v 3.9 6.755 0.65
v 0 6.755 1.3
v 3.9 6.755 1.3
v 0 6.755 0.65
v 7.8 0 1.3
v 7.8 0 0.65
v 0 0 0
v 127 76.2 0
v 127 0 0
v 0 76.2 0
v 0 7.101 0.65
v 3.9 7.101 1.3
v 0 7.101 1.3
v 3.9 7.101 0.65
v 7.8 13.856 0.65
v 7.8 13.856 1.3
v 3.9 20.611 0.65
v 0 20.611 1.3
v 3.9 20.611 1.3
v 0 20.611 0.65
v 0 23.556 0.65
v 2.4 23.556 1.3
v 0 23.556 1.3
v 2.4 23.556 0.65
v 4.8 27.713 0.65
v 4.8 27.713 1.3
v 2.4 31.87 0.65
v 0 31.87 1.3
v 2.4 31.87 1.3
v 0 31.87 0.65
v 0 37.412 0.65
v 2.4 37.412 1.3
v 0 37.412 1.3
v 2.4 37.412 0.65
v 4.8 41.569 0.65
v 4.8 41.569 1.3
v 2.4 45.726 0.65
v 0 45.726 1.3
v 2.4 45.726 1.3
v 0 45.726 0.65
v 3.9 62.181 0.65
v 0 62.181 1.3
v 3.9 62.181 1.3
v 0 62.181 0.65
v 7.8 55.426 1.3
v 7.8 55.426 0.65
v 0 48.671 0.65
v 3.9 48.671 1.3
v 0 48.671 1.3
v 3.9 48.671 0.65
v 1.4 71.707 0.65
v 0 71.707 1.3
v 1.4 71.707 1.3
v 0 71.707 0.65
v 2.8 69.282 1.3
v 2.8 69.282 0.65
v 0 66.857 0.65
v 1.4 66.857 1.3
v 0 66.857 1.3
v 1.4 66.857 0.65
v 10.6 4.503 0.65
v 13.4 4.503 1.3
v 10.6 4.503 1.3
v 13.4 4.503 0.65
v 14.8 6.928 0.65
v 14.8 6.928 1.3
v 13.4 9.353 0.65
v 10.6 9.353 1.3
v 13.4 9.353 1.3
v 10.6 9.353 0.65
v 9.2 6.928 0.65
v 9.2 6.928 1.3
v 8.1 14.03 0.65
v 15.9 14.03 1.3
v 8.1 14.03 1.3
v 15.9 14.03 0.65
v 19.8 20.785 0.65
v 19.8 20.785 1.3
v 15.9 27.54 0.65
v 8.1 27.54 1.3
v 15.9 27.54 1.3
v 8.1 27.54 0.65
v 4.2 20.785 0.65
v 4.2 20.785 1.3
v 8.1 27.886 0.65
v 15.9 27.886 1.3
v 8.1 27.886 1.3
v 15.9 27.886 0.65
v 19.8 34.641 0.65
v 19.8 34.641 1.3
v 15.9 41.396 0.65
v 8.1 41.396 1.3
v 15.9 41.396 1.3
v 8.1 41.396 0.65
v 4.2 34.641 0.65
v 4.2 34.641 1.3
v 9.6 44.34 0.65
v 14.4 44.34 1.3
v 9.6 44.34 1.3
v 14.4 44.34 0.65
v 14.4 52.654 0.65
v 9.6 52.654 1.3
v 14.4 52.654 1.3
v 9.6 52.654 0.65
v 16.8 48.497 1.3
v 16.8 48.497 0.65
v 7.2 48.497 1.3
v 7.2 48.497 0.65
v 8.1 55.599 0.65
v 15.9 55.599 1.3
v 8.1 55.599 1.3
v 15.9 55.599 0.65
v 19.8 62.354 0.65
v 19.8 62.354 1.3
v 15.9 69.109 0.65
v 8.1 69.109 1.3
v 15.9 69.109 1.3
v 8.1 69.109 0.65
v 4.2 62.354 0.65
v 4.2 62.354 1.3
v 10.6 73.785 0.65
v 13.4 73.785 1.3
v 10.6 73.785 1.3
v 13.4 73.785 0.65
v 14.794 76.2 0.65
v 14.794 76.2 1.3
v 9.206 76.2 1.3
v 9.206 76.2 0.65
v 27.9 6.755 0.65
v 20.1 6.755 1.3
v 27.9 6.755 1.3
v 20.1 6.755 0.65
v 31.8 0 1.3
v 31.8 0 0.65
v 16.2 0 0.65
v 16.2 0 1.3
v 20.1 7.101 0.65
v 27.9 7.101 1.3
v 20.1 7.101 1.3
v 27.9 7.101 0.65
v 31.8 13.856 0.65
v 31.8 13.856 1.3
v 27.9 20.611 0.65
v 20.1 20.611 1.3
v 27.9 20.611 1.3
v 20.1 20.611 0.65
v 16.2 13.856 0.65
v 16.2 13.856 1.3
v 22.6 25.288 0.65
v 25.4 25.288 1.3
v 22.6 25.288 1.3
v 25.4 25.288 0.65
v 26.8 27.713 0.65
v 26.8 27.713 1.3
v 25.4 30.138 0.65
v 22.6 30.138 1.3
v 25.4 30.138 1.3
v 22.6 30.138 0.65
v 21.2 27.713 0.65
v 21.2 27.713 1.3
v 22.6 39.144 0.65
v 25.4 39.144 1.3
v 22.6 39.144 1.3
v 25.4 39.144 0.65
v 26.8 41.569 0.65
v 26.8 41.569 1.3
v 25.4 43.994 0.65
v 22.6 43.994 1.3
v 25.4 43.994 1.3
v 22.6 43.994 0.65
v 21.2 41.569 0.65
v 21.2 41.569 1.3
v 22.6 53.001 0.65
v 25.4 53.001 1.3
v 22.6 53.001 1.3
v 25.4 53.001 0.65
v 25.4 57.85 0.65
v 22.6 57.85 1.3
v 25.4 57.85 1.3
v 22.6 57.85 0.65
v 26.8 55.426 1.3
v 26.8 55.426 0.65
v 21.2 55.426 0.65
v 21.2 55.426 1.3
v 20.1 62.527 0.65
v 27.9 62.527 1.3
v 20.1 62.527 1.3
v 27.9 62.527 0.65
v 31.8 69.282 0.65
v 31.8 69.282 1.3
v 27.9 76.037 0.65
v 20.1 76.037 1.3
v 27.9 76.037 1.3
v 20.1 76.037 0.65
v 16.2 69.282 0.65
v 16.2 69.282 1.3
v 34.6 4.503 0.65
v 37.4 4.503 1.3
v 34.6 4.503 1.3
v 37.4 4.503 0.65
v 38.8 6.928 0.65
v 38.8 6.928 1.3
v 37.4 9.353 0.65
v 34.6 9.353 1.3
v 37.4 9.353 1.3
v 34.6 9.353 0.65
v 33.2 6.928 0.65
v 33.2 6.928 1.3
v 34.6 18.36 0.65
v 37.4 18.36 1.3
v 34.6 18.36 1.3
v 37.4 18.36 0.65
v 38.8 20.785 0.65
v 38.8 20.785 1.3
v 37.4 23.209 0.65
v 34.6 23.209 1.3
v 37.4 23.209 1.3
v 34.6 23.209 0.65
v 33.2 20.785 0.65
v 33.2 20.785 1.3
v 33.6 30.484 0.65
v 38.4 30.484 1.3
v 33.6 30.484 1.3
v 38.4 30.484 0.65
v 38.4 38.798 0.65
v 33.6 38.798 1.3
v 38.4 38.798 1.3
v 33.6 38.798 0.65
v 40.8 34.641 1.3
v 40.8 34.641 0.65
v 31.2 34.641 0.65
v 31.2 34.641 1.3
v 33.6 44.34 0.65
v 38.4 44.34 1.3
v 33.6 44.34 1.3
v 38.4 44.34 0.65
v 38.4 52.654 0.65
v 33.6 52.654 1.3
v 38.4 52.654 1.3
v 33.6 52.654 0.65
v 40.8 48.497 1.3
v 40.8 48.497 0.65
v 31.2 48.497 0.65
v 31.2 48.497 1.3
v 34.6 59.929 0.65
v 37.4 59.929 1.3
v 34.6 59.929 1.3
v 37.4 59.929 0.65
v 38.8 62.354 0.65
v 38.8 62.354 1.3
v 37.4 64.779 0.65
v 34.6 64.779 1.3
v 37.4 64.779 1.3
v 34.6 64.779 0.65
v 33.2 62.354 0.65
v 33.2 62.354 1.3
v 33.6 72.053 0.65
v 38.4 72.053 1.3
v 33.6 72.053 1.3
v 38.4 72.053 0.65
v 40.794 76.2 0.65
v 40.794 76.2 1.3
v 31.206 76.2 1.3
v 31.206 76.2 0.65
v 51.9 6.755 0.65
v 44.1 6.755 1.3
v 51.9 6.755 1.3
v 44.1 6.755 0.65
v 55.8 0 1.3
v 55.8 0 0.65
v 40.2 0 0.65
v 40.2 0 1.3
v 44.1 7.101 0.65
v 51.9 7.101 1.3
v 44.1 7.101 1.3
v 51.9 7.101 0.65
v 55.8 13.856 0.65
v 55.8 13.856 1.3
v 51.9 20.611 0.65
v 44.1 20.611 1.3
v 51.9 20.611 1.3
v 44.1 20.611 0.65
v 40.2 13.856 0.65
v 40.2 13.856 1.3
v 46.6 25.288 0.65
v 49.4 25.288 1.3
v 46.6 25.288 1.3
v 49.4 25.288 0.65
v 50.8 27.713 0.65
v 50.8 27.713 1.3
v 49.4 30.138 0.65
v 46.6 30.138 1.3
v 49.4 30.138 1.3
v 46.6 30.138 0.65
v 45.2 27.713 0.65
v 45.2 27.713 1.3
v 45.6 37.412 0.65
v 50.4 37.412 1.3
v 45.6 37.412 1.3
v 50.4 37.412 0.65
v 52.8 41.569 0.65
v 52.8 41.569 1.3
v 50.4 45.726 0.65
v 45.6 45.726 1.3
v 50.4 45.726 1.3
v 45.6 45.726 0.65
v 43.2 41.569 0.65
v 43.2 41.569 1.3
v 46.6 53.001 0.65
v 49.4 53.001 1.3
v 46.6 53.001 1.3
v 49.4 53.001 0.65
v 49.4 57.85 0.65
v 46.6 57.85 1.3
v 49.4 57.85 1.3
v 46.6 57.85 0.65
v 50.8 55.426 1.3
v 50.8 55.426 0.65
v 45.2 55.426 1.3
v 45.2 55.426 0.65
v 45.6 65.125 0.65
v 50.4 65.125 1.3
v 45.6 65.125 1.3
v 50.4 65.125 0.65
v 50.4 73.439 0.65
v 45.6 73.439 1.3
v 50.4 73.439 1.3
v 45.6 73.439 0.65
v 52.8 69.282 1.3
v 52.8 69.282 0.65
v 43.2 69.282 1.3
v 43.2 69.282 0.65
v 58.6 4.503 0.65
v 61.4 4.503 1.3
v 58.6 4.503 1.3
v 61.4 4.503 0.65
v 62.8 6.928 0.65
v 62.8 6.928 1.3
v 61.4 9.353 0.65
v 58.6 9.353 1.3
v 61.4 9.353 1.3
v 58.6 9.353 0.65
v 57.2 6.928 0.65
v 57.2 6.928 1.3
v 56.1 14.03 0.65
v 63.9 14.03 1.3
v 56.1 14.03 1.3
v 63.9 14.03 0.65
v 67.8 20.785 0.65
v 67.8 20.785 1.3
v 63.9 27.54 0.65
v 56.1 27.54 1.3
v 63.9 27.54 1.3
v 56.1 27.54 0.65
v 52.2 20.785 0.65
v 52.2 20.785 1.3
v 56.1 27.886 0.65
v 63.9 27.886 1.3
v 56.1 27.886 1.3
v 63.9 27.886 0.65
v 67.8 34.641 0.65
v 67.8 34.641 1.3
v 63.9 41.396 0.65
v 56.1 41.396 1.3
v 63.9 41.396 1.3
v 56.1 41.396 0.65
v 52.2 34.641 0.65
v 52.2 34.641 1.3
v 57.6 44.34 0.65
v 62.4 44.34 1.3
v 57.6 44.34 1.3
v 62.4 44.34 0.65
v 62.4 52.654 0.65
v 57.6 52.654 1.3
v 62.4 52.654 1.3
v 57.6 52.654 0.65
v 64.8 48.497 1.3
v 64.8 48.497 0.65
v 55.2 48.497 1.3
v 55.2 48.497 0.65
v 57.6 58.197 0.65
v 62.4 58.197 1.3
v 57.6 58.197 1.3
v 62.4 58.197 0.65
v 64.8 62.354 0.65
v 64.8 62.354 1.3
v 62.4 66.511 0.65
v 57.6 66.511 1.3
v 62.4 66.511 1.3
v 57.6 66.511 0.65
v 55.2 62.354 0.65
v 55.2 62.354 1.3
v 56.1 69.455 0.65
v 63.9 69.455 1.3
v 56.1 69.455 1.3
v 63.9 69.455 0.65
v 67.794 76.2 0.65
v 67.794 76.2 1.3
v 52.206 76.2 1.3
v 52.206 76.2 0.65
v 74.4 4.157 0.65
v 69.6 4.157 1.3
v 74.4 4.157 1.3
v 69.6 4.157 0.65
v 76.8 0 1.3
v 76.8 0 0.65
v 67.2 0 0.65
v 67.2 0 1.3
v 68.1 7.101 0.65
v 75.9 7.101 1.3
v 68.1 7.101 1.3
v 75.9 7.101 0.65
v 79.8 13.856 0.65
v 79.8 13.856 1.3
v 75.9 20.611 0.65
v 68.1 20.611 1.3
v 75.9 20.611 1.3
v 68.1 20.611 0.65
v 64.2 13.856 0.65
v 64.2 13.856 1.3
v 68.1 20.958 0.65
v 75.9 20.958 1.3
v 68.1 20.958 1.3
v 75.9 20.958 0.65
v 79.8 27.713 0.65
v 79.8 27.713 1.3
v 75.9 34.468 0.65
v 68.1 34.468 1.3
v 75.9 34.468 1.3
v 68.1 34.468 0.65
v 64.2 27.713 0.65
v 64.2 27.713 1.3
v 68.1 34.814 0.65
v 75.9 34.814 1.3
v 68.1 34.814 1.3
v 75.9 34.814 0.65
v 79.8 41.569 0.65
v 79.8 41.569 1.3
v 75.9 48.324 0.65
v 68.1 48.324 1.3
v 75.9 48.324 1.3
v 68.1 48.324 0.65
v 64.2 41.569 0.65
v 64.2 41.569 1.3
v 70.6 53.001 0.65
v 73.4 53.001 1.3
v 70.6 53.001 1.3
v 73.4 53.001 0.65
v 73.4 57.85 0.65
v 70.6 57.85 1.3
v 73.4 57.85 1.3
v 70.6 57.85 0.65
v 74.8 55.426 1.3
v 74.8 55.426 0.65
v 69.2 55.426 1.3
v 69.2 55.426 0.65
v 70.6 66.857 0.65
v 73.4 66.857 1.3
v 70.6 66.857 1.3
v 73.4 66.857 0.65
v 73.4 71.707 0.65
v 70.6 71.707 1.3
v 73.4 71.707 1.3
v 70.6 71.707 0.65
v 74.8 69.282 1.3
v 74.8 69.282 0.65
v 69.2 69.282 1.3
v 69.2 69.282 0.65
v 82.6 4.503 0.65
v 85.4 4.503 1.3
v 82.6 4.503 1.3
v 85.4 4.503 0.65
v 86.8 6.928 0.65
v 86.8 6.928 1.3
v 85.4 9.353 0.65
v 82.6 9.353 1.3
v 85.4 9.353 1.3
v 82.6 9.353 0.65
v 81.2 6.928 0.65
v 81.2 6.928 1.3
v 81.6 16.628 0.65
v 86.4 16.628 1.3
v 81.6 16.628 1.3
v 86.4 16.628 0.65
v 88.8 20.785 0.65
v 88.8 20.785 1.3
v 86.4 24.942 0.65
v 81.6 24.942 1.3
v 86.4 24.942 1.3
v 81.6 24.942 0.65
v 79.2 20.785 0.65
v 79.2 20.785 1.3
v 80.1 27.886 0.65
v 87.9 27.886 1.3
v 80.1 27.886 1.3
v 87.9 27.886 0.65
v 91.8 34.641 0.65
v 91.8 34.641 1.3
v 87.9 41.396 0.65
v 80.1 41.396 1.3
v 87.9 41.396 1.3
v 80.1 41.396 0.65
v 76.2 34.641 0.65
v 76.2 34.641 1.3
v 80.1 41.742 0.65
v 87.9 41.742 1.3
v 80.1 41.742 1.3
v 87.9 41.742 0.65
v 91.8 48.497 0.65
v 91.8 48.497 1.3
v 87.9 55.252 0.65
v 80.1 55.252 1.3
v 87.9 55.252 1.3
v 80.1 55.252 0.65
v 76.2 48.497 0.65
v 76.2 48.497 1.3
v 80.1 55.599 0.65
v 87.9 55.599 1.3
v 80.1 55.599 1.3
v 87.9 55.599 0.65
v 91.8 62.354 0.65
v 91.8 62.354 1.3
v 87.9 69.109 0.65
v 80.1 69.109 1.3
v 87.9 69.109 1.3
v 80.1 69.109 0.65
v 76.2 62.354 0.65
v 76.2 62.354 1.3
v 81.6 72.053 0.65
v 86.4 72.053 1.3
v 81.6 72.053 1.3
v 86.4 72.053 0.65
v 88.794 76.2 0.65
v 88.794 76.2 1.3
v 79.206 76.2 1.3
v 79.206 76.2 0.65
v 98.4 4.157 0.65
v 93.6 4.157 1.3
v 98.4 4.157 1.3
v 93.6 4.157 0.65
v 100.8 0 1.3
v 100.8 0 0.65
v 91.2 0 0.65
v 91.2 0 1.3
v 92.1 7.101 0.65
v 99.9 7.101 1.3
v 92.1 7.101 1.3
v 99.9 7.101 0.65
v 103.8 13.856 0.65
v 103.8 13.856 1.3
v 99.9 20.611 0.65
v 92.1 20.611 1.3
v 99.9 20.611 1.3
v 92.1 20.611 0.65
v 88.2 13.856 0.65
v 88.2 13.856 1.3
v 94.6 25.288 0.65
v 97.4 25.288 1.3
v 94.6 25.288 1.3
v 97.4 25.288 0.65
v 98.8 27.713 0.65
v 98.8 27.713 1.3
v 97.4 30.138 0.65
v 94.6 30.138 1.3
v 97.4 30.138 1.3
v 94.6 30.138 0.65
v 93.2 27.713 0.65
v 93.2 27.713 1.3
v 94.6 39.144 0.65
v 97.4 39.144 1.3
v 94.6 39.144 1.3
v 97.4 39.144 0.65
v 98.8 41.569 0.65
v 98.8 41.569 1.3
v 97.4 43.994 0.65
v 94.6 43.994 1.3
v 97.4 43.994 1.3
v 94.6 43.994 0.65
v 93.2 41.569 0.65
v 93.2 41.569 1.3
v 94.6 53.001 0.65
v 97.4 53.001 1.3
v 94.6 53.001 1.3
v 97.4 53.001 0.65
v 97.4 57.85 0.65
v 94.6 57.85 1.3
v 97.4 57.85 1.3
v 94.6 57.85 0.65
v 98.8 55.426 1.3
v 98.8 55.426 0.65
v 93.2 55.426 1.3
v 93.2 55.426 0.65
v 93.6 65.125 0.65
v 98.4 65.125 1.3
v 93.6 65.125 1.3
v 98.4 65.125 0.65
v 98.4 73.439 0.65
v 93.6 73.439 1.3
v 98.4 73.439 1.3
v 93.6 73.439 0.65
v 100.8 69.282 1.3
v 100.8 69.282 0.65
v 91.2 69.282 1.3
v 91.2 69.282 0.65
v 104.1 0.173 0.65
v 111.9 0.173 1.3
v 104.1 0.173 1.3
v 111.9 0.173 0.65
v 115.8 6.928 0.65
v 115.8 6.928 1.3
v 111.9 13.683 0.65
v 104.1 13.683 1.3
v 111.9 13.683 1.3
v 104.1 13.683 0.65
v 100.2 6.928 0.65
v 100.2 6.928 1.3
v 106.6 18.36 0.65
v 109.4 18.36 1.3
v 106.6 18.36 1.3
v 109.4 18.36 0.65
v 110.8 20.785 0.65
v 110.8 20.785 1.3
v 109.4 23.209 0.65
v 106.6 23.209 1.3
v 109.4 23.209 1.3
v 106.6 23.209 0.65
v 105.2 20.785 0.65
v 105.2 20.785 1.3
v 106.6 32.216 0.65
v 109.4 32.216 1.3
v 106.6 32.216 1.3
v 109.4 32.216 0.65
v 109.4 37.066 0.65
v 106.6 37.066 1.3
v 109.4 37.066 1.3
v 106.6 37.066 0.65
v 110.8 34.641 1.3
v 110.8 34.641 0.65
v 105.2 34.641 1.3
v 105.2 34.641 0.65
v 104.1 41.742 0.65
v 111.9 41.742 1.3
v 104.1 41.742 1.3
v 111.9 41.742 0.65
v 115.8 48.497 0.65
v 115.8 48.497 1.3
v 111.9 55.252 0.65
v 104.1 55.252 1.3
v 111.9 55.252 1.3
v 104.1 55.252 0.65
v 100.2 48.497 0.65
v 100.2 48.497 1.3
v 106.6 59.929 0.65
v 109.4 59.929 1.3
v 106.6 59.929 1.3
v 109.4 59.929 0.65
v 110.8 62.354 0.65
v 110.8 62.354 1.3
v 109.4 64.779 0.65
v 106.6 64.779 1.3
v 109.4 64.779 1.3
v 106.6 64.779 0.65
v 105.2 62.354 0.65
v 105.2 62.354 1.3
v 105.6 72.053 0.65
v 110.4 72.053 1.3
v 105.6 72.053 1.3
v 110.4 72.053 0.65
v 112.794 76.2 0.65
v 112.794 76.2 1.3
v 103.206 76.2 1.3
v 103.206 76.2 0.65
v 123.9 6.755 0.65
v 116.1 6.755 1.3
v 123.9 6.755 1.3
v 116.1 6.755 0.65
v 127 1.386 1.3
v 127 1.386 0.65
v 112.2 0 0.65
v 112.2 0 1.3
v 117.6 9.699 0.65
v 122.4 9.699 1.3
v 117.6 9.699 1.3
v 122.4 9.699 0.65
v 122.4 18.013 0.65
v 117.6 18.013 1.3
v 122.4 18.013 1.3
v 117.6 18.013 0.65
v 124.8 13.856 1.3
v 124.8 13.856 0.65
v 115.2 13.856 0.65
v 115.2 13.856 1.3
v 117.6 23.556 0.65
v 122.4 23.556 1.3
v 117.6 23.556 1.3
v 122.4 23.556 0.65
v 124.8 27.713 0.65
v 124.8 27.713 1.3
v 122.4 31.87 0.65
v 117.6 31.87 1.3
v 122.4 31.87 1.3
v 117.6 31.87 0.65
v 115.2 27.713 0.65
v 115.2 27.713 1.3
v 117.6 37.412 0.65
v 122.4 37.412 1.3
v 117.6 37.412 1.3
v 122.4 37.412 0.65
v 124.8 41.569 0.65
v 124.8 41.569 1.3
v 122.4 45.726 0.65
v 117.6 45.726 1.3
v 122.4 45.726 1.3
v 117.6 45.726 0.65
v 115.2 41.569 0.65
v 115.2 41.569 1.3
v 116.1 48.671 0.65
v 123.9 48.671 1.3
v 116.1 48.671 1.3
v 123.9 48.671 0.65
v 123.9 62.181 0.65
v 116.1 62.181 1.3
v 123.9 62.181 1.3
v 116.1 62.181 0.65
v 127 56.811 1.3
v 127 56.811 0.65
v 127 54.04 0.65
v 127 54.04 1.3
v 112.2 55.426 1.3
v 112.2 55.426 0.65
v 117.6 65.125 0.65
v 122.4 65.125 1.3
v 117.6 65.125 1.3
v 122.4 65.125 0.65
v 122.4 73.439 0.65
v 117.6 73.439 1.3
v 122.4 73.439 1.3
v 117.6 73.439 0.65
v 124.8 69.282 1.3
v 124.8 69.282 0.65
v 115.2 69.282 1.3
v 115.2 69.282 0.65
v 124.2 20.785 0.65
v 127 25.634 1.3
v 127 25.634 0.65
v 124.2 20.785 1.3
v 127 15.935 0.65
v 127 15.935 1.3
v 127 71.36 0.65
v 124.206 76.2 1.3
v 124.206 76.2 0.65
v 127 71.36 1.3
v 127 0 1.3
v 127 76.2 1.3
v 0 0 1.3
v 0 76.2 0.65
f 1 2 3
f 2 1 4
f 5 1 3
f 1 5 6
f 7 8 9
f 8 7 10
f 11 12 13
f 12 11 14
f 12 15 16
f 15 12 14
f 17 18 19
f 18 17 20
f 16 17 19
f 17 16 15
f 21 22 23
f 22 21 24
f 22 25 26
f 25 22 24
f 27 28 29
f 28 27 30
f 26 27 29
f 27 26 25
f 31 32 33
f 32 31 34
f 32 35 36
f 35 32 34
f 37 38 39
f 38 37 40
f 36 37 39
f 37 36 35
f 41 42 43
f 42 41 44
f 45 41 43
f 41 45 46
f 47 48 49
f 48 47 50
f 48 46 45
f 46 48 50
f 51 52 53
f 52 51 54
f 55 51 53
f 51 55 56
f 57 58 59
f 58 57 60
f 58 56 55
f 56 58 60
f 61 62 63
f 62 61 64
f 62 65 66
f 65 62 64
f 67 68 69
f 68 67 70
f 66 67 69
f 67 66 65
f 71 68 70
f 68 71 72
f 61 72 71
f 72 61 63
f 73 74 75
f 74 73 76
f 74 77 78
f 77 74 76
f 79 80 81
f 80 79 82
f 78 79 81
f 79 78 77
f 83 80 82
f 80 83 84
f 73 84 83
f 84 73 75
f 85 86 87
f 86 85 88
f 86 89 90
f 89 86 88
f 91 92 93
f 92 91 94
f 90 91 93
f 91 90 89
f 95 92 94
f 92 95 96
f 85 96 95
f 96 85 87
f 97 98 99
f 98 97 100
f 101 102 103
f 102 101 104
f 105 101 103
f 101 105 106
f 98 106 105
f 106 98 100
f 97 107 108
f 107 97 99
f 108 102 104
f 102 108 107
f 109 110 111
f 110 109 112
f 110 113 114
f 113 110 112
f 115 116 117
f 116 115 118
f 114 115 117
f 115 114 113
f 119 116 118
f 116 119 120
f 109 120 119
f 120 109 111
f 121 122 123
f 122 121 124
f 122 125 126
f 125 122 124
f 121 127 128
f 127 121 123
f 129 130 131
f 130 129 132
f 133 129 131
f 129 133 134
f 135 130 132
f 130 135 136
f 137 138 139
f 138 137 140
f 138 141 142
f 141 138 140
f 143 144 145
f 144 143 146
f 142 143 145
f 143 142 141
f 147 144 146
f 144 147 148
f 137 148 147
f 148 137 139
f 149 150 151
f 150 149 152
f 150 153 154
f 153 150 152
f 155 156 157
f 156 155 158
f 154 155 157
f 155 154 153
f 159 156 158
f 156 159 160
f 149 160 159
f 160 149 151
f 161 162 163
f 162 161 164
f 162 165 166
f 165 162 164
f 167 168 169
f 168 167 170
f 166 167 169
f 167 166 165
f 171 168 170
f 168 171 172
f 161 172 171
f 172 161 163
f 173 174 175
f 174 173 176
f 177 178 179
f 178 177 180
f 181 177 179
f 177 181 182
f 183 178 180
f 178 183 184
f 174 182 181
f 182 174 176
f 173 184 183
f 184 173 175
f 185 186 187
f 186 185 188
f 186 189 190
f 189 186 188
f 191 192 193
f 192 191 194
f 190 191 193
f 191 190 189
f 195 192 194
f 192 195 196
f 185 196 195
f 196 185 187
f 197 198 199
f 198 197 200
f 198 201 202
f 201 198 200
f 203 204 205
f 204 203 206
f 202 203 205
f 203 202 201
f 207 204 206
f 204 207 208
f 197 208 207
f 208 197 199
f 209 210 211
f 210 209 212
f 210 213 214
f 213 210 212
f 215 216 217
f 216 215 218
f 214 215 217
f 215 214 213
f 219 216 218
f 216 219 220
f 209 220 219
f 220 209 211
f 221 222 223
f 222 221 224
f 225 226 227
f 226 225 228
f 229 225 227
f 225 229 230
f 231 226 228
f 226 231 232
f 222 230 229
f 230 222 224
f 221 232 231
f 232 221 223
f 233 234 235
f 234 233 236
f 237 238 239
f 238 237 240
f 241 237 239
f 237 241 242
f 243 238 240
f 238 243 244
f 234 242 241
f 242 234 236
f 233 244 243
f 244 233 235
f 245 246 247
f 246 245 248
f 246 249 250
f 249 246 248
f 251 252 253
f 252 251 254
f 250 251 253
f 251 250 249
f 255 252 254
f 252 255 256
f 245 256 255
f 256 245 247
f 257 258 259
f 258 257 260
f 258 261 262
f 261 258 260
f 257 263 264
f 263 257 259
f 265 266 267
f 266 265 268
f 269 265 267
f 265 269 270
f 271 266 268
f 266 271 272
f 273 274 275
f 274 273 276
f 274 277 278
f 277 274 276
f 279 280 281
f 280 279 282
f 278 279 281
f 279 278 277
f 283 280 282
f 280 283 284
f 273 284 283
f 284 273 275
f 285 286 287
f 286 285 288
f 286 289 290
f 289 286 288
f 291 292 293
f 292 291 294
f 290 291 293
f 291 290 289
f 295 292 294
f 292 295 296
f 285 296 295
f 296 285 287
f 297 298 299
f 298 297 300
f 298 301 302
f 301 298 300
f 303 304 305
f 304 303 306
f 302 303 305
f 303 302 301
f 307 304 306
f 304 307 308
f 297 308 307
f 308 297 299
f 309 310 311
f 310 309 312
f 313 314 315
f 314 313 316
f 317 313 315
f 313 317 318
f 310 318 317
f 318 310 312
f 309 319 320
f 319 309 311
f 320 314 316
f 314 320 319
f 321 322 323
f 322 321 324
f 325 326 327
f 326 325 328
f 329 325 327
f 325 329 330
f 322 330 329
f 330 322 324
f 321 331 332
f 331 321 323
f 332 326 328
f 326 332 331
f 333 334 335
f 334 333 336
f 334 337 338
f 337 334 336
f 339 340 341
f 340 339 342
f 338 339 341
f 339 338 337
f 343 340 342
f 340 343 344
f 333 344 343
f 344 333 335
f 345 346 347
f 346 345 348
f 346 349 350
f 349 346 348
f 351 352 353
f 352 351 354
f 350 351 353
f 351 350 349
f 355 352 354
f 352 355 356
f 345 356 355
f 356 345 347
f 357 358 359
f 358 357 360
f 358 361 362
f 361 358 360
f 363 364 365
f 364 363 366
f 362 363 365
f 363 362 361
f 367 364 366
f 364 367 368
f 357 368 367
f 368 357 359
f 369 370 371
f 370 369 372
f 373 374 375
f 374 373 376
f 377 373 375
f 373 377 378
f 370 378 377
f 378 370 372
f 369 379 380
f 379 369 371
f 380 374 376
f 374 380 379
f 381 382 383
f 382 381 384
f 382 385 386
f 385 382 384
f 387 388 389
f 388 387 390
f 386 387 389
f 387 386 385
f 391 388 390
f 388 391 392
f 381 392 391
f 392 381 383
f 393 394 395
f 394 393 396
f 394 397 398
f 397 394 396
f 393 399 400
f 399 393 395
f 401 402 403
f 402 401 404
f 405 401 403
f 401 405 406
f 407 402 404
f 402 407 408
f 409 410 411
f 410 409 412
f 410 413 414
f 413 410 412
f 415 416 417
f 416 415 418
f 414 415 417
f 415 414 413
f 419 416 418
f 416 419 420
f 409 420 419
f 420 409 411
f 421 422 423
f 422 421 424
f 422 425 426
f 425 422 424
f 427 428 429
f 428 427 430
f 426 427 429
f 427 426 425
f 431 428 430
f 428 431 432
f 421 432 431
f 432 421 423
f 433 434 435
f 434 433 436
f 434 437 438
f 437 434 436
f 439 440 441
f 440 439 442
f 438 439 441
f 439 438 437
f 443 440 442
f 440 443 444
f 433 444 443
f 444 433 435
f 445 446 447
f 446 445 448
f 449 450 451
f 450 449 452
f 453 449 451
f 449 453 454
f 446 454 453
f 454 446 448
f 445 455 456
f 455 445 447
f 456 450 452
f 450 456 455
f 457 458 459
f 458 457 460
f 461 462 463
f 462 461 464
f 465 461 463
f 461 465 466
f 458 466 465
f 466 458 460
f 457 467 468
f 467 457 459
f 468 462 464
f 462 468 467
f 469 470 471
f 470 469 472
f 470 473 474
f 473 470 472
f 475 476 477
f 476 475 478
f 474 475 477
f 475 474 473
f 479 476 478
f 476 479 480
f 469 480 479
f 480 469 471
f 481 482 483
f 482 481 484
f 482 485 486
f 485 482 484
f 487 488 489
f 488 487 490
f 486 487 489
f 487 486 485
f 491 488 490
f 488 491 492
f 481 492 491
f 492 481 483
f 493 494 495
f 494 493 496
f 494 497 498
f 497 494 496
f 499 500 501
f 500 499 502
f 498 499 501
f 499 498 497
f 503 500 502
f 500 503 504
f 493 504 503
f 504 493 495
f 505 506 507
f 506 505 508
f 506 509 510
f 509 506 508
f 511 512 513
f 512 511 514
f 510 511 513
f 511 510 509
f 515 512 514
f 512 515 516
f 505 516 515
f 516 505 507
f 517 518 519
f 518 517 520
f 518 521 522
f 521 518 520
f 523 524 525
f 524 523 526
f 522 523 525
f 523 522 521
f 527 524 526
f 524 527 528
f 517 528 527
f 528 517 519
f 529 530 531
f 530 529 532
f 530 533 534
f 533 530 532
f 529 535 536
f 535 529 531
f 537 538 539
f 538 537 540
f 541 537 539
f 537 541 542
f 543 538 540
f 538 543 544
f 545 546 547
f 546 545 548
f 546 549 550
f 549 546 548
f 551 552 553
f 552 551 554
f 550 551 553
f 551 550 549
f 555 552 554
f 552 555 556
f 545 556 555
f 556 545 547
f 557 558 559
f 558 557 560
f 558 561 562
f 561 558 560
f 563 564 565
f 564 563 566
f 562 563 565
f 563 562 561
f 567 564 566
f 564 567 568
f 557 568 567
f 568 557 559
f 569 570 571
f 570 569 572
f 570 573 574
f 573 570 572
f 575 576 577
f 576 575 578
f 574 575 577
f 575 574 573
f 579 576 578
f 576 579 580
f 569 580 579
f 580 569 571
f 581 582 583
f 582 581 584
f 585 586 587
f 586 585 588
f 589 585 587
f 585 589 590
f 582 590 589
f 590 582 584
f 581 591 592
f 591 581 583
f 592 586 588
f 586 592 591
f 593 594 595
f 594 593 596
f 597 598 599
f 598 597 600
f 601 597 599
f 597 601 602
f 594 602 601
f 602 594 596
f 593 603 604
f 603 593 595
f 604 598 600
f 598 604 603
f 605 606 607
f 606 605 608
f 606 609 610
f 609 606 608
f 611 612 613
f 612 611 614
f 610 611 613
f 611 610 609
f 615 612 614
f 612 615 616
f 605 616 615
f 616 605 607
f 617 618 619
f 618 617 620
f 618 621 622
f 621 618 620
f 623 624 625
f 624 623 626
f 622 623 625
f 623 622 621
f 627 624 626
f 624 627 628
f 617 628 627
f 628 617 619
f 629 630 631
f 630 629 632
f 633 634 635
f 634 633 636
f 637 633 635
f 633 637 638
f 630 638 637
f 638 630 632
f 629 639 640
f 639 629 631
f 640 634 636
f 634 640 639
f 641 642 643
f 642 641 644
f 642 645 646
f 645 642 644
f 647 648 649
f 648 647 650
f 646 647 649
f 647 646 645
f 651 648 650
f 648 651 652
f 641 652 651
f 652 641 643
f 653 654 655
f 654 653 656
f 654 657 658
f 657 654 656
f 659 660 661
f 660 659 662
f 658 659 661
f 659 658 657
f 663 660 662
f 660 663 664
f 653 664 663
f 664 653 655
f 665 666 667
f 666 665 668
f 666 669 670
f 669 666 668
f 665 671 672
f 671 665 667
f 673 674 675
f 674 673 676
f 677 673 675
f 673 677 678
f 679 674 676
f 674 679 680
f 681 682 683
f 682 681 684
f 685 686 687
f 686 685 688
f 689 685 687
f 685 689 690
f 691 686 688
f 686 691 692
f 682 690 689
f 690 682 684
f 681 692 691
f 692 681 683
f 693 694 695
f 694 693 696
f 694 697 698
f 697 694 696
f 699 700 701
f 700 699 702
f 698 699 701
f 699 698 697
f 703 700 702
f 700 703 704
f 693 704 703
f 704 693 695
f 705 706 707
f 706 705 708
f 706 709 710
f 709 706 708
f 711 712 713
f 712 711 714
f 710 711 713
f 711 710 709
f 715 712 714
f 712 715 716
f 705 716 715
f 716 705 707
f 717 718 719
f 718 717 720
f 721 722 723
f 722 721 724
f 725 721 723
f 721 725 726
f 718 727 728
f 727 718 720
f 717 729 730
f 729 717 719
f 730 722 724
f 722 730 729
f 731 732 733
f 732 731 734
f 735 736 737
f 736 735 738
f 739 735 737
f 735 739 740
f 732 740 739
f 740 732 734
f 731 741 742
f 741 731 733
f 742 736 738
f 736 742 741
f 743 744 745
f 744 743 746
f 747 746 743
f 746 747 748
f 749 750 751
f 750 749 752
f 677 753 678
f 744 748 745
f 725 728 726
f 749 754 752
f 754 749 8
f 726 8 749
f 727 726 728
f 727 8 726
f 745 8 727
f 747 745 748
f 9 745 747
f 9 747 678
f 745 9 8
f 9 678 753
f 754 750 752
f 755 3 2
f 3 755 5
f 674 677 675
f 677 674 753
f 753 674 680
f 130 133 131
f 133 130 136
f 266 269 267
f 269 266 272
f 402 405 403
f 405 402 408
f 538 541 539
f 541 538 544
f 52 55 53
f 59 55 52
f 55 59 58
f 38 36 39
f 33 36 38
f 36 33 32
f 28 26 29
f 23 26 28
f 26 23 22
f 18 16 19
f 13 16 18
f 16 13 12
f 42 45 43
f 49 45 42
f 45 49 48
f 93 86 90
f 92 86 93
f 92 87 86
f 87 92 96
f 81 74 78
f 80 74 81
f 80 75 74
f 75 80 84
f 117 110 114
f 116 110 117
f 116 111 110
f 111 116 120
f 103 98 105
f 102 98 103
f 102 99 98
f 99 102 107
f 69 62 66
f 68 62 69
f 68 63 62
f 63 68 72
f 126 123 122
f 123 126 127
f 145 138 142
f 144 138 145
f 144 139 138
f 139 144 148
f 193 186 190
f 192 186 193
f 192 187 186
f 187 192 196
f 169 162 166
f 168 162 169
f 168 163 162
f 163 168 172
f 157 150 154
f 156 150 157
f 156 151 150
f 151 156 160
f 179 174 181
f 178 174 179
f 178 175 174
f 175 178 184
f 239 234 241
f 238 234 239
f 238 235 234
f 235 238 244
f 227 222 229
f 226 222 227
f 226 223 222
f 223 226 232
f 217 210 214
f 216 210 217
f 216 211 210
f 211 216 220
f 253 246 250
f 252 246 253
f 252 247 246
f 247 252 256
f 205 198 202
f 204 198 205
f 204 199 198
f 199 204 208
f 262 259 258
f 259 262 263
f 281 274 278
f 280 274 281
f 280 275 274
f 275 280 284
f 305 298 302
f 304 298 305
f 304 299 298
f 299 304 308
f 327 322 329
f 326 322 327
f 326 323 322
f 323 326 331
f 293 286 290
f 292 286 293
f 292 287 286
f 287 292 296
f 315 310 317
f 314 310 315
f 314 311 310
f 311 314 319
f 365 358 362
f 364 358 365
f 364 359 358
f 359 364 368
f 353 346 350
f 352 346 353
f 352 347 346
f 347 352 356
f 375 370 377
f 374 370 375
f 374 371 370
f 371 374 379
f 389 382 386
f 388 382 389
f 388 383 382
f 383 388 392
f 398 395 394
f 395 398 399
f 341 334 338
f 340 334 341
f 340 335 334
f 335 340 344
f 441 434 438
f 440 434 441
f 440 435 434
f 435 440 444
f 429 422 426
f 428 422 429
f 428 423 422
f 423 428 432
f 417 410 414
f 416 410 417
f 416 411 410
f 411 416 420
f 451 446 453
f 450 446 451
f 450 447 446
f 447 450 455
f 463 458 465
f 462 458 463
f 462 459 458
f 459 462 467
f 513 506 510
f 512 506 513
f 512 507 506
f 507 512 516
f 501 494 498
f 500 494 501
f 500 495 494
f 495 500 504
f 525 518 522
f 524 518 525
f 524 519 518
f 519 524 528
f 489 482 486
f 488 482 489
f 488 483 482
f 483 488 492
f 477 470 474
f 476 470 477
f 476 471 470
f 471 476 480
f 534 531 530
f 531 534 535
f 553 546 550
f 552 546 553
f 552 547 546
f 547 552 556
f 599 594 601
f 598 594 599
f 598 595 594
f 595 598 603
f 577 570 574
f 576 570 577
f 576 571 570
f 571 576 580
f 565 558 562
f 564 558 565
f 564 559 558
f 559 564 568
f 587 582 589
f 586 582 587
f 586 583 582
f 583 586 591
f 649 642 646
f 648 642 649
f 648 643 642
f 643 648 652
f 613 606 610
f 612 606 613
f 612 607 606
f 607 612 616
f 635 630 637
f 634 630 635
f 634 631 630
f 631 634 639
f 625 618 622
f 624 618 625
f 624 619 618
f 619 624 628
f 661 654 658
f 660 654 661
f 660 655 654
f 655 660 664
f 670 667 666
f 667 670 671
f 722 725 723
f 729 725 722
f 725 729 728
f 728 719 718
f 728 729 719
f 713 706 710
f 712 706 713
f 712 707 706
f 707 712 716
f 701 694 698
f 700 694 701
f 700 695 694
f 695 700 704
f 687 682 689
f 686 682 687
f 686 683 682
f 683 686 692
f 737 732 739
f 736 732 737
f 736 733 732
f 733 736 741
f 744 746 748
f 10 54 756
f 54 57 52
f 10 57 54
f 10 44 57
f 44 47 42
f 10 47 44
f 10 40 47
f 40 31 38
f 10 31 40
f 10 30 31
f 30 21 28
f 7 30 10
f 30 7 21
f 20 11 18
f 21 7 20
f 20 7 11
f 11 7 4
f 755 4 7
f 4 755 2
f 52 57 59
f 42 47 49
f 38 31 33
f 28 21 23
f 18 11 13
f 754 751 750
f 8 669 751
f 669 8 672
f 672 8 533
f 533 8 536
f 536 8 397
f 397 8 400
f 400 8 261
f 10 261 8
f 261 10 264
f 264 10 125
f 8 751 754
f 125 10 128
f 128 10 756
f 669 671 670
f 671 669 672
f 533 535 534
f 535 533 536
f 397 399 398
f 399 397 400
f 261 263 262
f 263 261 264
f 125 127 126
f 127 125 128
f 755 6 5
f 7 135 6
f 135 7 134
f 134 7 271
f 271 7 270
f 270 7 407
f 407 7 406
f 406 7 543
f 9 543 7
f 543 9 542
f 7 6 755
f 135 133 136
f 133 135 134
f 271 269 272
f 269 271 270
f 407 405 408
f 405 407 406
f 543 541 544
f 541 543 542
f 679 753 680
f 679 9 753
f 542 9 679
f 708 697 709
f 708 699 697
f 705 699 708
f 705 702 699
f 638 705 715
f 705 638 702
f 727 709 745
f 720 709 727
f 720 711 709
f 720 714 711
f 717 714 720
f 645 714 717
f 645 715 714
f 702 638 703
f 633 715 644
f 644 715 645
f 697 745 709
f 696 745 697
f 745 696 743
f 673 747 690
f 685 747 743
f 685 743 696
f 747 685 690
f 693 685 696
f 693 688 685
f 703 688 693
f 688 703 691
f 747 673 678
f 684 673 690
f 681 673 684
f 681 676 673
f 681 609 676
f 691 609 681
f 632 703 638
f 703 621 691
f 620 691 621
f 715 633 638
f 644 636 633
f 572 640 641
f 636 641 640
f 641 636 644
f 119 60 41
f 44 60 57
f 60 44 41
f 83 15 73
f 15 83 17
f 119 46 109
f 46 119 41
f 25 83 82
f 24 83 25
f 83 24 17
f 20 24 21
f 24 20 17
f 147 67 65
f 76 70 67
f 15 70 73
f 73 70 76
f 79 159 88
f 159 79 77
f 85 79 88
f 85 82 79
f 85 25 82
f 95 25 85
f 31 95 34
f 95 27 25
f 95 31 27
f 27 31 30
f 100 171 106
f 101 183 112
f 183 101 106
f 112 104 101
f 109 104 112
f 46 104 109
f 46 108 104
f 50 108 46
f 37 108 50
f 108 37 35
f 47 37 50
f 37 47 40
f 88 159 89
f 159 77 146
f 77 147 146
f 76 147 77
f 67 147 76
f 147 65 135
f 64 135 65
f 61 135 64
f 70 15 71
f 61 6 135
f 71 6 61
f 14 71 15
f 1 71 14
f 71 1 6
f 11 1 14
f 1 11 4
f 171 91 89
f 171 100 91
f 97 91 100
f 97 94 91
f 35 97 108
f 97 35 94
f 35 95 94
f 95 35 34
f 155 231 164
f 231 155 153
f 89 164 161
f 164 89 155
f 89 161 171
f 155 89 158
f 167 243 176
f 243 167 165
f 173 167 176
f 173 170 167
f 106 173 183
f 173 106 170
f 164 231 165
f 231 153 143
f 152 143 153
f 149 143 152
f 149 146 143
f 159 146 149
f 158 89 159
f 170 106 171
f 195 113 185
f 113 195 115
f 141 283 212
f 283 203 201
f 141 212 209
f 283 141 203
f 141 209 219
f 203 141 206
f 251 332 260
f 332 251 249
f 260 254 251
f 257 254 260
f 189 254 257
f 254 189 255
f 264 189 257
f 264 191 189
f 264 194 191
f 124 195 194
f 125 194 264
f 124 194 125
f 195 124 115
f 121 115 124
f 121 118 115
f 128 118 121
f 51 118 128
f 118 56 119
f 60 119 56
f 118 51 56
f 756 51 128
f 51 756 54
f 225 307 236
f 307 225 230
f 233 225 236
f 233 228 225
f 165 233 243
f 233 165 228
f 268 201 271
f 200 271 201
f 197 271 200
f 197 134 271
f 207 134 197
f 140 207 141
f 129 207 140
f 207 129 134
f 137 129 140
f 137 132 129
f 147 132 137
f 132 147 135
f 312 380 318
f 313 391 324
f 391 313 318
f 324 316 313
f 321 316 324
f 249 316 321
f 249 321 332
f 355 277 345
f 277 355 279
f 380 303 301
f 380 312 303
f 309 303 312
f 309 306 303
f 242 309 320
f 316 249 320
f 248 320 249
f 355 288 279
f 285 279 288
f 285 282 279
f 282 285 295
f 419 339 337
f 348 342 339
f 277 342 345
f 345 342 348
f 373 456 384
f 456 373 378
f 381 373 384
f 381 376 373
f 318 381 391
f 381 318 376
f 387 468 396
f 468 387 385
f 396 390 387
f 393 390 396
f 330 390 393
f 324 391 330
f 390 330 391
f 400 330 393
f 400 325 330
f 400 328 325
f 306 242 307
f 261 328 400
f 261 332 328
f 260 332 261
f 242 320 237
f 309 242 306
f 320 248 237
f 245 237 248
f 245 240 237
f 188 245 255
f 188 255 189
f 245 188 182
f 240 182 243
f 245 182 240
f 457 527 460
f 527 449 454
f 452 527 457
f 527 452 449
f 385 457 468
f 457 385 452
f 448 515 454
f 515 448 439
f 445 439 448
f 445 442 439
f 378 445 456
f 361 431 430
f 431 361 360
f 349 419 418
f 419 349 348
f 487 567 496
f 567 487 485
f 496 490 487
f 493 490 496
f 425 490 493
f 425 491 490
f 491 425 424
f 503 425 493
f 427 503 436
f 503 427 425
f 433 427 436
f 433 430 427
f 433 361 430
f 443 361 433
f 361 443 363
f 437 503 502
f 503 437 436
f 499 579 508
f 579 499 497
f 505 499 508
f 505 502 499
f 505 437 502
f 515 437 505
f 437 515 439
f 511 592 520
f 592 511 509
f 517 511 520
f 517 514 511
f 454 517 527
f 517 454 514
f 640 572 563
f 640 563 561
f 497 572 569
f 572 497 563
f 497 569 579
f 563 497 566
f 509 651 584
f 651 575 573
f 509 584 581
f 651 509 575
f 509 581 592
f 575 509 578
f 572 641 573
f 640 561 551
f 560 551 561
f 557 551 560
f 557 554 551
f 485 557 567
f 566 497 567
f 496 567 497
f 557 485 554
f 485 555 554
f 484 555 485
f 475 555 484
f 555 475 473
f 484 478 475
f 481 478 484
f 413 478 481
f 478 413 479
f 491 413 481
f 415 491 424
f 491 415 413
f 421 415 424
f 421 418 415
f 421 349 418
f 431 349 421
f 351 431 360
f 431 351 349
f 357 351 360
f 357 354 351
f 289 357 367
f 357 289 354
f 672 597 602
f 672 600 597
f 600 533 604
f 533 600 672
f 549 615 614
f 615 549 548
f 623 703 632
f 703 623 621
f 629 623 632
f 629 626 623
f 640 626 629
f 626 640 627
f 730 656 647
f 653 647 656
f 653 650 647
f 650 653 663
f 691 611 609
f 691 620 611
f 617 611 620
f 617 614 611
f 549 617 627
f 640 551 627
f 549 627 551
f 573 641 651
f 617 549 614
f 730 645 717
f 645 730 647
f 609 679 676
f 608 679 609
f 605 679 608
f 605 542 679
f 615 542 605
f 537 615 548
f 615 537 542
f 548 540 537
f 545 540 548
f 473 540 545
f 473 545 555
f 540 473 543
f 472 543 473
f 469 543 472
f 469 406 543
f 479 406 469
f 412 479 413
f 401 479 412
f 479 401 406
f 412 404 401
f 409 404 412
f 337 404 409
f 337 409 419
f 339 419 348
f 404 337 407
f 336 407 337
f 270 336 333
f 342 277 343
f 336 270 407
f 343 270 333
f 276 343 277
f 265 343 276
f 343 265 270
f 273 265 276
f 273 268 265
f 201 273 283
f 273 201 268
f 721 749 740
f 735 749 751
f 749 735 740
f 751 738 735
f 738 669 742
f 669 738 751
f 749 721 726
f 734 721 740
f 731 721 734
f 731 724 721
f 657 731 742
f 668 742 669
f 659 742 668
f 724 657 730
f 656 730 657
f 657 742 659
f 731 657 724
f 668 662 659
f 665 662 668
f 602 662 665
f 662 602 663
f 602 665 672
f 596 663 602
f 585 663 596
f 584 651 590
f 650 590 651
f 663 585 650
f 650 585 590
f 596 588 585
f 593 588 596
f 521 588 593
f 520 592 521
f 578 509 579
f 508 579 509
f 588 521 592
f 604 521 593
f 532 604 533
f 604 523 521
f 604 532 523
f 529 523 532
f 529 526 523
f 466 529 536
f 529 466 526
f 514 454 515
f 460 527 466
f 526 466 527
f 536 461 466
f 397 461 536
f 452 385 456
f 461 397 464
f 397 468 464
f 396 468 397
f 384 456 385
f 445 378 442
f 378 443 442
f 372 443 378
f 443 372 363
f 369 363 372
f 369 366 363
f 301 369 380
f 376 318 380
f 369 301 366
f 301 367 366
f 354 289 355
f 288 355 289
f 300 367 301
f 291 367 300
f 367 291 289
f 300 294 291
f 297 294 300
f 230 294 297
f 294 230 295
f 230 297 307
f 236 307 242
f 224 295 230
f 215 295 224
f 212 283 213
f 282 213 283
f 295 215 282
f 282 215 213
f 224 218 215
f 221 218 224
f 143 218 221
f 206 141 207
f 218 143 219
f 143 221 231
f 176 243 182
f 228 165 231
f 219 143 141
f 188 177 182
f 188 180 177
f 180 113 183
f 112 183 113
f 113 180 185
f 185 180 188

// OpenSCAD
inch = 25.4;
hex_sm = 3;
hex_md = 5;
hex_lg = 8;
hex_height = 2;
wall_gap   = 0.4;
length = 5 * inch;
width  = 3 * inch;
height = 1.3;
seed = 42;
// col spacing
col = 1.5 * hex_lg;
// row spacing
row = sqrt(3) * hex_lg;   

nx = ceil(length / col) + 2;
ny = ceil(width  / row) + 2;

sizes = [hex_sm, hex_md, hex_lg];

// random index 0..2, seeded per cell so it's stable between renders
function pick_size(i, j) =
    sizes[ min(2, floor(rands(0, 3, 1, seed + i*131 + j*17)[0])) ];

module hexagon(R) {
    cylinder(h = hex_height, r = R - wall_gap/2, $fn = 6);
}

module hex_field() {
    for (i = [-1 : nx]) {
        for (j = [-1 : ny]) {
            translate([ i*col,
                        j*row + (i % 2 ? row/2 : 0),  // stagger odd columns
                        0 ]) {
                hexagon(pick_size(i, j));
            }
        }
    }
}

union() {
    intersection() {
        hex_field();
        cube([length, width, height]);
    }
    cube([length, width, (height / 2)]);
}
